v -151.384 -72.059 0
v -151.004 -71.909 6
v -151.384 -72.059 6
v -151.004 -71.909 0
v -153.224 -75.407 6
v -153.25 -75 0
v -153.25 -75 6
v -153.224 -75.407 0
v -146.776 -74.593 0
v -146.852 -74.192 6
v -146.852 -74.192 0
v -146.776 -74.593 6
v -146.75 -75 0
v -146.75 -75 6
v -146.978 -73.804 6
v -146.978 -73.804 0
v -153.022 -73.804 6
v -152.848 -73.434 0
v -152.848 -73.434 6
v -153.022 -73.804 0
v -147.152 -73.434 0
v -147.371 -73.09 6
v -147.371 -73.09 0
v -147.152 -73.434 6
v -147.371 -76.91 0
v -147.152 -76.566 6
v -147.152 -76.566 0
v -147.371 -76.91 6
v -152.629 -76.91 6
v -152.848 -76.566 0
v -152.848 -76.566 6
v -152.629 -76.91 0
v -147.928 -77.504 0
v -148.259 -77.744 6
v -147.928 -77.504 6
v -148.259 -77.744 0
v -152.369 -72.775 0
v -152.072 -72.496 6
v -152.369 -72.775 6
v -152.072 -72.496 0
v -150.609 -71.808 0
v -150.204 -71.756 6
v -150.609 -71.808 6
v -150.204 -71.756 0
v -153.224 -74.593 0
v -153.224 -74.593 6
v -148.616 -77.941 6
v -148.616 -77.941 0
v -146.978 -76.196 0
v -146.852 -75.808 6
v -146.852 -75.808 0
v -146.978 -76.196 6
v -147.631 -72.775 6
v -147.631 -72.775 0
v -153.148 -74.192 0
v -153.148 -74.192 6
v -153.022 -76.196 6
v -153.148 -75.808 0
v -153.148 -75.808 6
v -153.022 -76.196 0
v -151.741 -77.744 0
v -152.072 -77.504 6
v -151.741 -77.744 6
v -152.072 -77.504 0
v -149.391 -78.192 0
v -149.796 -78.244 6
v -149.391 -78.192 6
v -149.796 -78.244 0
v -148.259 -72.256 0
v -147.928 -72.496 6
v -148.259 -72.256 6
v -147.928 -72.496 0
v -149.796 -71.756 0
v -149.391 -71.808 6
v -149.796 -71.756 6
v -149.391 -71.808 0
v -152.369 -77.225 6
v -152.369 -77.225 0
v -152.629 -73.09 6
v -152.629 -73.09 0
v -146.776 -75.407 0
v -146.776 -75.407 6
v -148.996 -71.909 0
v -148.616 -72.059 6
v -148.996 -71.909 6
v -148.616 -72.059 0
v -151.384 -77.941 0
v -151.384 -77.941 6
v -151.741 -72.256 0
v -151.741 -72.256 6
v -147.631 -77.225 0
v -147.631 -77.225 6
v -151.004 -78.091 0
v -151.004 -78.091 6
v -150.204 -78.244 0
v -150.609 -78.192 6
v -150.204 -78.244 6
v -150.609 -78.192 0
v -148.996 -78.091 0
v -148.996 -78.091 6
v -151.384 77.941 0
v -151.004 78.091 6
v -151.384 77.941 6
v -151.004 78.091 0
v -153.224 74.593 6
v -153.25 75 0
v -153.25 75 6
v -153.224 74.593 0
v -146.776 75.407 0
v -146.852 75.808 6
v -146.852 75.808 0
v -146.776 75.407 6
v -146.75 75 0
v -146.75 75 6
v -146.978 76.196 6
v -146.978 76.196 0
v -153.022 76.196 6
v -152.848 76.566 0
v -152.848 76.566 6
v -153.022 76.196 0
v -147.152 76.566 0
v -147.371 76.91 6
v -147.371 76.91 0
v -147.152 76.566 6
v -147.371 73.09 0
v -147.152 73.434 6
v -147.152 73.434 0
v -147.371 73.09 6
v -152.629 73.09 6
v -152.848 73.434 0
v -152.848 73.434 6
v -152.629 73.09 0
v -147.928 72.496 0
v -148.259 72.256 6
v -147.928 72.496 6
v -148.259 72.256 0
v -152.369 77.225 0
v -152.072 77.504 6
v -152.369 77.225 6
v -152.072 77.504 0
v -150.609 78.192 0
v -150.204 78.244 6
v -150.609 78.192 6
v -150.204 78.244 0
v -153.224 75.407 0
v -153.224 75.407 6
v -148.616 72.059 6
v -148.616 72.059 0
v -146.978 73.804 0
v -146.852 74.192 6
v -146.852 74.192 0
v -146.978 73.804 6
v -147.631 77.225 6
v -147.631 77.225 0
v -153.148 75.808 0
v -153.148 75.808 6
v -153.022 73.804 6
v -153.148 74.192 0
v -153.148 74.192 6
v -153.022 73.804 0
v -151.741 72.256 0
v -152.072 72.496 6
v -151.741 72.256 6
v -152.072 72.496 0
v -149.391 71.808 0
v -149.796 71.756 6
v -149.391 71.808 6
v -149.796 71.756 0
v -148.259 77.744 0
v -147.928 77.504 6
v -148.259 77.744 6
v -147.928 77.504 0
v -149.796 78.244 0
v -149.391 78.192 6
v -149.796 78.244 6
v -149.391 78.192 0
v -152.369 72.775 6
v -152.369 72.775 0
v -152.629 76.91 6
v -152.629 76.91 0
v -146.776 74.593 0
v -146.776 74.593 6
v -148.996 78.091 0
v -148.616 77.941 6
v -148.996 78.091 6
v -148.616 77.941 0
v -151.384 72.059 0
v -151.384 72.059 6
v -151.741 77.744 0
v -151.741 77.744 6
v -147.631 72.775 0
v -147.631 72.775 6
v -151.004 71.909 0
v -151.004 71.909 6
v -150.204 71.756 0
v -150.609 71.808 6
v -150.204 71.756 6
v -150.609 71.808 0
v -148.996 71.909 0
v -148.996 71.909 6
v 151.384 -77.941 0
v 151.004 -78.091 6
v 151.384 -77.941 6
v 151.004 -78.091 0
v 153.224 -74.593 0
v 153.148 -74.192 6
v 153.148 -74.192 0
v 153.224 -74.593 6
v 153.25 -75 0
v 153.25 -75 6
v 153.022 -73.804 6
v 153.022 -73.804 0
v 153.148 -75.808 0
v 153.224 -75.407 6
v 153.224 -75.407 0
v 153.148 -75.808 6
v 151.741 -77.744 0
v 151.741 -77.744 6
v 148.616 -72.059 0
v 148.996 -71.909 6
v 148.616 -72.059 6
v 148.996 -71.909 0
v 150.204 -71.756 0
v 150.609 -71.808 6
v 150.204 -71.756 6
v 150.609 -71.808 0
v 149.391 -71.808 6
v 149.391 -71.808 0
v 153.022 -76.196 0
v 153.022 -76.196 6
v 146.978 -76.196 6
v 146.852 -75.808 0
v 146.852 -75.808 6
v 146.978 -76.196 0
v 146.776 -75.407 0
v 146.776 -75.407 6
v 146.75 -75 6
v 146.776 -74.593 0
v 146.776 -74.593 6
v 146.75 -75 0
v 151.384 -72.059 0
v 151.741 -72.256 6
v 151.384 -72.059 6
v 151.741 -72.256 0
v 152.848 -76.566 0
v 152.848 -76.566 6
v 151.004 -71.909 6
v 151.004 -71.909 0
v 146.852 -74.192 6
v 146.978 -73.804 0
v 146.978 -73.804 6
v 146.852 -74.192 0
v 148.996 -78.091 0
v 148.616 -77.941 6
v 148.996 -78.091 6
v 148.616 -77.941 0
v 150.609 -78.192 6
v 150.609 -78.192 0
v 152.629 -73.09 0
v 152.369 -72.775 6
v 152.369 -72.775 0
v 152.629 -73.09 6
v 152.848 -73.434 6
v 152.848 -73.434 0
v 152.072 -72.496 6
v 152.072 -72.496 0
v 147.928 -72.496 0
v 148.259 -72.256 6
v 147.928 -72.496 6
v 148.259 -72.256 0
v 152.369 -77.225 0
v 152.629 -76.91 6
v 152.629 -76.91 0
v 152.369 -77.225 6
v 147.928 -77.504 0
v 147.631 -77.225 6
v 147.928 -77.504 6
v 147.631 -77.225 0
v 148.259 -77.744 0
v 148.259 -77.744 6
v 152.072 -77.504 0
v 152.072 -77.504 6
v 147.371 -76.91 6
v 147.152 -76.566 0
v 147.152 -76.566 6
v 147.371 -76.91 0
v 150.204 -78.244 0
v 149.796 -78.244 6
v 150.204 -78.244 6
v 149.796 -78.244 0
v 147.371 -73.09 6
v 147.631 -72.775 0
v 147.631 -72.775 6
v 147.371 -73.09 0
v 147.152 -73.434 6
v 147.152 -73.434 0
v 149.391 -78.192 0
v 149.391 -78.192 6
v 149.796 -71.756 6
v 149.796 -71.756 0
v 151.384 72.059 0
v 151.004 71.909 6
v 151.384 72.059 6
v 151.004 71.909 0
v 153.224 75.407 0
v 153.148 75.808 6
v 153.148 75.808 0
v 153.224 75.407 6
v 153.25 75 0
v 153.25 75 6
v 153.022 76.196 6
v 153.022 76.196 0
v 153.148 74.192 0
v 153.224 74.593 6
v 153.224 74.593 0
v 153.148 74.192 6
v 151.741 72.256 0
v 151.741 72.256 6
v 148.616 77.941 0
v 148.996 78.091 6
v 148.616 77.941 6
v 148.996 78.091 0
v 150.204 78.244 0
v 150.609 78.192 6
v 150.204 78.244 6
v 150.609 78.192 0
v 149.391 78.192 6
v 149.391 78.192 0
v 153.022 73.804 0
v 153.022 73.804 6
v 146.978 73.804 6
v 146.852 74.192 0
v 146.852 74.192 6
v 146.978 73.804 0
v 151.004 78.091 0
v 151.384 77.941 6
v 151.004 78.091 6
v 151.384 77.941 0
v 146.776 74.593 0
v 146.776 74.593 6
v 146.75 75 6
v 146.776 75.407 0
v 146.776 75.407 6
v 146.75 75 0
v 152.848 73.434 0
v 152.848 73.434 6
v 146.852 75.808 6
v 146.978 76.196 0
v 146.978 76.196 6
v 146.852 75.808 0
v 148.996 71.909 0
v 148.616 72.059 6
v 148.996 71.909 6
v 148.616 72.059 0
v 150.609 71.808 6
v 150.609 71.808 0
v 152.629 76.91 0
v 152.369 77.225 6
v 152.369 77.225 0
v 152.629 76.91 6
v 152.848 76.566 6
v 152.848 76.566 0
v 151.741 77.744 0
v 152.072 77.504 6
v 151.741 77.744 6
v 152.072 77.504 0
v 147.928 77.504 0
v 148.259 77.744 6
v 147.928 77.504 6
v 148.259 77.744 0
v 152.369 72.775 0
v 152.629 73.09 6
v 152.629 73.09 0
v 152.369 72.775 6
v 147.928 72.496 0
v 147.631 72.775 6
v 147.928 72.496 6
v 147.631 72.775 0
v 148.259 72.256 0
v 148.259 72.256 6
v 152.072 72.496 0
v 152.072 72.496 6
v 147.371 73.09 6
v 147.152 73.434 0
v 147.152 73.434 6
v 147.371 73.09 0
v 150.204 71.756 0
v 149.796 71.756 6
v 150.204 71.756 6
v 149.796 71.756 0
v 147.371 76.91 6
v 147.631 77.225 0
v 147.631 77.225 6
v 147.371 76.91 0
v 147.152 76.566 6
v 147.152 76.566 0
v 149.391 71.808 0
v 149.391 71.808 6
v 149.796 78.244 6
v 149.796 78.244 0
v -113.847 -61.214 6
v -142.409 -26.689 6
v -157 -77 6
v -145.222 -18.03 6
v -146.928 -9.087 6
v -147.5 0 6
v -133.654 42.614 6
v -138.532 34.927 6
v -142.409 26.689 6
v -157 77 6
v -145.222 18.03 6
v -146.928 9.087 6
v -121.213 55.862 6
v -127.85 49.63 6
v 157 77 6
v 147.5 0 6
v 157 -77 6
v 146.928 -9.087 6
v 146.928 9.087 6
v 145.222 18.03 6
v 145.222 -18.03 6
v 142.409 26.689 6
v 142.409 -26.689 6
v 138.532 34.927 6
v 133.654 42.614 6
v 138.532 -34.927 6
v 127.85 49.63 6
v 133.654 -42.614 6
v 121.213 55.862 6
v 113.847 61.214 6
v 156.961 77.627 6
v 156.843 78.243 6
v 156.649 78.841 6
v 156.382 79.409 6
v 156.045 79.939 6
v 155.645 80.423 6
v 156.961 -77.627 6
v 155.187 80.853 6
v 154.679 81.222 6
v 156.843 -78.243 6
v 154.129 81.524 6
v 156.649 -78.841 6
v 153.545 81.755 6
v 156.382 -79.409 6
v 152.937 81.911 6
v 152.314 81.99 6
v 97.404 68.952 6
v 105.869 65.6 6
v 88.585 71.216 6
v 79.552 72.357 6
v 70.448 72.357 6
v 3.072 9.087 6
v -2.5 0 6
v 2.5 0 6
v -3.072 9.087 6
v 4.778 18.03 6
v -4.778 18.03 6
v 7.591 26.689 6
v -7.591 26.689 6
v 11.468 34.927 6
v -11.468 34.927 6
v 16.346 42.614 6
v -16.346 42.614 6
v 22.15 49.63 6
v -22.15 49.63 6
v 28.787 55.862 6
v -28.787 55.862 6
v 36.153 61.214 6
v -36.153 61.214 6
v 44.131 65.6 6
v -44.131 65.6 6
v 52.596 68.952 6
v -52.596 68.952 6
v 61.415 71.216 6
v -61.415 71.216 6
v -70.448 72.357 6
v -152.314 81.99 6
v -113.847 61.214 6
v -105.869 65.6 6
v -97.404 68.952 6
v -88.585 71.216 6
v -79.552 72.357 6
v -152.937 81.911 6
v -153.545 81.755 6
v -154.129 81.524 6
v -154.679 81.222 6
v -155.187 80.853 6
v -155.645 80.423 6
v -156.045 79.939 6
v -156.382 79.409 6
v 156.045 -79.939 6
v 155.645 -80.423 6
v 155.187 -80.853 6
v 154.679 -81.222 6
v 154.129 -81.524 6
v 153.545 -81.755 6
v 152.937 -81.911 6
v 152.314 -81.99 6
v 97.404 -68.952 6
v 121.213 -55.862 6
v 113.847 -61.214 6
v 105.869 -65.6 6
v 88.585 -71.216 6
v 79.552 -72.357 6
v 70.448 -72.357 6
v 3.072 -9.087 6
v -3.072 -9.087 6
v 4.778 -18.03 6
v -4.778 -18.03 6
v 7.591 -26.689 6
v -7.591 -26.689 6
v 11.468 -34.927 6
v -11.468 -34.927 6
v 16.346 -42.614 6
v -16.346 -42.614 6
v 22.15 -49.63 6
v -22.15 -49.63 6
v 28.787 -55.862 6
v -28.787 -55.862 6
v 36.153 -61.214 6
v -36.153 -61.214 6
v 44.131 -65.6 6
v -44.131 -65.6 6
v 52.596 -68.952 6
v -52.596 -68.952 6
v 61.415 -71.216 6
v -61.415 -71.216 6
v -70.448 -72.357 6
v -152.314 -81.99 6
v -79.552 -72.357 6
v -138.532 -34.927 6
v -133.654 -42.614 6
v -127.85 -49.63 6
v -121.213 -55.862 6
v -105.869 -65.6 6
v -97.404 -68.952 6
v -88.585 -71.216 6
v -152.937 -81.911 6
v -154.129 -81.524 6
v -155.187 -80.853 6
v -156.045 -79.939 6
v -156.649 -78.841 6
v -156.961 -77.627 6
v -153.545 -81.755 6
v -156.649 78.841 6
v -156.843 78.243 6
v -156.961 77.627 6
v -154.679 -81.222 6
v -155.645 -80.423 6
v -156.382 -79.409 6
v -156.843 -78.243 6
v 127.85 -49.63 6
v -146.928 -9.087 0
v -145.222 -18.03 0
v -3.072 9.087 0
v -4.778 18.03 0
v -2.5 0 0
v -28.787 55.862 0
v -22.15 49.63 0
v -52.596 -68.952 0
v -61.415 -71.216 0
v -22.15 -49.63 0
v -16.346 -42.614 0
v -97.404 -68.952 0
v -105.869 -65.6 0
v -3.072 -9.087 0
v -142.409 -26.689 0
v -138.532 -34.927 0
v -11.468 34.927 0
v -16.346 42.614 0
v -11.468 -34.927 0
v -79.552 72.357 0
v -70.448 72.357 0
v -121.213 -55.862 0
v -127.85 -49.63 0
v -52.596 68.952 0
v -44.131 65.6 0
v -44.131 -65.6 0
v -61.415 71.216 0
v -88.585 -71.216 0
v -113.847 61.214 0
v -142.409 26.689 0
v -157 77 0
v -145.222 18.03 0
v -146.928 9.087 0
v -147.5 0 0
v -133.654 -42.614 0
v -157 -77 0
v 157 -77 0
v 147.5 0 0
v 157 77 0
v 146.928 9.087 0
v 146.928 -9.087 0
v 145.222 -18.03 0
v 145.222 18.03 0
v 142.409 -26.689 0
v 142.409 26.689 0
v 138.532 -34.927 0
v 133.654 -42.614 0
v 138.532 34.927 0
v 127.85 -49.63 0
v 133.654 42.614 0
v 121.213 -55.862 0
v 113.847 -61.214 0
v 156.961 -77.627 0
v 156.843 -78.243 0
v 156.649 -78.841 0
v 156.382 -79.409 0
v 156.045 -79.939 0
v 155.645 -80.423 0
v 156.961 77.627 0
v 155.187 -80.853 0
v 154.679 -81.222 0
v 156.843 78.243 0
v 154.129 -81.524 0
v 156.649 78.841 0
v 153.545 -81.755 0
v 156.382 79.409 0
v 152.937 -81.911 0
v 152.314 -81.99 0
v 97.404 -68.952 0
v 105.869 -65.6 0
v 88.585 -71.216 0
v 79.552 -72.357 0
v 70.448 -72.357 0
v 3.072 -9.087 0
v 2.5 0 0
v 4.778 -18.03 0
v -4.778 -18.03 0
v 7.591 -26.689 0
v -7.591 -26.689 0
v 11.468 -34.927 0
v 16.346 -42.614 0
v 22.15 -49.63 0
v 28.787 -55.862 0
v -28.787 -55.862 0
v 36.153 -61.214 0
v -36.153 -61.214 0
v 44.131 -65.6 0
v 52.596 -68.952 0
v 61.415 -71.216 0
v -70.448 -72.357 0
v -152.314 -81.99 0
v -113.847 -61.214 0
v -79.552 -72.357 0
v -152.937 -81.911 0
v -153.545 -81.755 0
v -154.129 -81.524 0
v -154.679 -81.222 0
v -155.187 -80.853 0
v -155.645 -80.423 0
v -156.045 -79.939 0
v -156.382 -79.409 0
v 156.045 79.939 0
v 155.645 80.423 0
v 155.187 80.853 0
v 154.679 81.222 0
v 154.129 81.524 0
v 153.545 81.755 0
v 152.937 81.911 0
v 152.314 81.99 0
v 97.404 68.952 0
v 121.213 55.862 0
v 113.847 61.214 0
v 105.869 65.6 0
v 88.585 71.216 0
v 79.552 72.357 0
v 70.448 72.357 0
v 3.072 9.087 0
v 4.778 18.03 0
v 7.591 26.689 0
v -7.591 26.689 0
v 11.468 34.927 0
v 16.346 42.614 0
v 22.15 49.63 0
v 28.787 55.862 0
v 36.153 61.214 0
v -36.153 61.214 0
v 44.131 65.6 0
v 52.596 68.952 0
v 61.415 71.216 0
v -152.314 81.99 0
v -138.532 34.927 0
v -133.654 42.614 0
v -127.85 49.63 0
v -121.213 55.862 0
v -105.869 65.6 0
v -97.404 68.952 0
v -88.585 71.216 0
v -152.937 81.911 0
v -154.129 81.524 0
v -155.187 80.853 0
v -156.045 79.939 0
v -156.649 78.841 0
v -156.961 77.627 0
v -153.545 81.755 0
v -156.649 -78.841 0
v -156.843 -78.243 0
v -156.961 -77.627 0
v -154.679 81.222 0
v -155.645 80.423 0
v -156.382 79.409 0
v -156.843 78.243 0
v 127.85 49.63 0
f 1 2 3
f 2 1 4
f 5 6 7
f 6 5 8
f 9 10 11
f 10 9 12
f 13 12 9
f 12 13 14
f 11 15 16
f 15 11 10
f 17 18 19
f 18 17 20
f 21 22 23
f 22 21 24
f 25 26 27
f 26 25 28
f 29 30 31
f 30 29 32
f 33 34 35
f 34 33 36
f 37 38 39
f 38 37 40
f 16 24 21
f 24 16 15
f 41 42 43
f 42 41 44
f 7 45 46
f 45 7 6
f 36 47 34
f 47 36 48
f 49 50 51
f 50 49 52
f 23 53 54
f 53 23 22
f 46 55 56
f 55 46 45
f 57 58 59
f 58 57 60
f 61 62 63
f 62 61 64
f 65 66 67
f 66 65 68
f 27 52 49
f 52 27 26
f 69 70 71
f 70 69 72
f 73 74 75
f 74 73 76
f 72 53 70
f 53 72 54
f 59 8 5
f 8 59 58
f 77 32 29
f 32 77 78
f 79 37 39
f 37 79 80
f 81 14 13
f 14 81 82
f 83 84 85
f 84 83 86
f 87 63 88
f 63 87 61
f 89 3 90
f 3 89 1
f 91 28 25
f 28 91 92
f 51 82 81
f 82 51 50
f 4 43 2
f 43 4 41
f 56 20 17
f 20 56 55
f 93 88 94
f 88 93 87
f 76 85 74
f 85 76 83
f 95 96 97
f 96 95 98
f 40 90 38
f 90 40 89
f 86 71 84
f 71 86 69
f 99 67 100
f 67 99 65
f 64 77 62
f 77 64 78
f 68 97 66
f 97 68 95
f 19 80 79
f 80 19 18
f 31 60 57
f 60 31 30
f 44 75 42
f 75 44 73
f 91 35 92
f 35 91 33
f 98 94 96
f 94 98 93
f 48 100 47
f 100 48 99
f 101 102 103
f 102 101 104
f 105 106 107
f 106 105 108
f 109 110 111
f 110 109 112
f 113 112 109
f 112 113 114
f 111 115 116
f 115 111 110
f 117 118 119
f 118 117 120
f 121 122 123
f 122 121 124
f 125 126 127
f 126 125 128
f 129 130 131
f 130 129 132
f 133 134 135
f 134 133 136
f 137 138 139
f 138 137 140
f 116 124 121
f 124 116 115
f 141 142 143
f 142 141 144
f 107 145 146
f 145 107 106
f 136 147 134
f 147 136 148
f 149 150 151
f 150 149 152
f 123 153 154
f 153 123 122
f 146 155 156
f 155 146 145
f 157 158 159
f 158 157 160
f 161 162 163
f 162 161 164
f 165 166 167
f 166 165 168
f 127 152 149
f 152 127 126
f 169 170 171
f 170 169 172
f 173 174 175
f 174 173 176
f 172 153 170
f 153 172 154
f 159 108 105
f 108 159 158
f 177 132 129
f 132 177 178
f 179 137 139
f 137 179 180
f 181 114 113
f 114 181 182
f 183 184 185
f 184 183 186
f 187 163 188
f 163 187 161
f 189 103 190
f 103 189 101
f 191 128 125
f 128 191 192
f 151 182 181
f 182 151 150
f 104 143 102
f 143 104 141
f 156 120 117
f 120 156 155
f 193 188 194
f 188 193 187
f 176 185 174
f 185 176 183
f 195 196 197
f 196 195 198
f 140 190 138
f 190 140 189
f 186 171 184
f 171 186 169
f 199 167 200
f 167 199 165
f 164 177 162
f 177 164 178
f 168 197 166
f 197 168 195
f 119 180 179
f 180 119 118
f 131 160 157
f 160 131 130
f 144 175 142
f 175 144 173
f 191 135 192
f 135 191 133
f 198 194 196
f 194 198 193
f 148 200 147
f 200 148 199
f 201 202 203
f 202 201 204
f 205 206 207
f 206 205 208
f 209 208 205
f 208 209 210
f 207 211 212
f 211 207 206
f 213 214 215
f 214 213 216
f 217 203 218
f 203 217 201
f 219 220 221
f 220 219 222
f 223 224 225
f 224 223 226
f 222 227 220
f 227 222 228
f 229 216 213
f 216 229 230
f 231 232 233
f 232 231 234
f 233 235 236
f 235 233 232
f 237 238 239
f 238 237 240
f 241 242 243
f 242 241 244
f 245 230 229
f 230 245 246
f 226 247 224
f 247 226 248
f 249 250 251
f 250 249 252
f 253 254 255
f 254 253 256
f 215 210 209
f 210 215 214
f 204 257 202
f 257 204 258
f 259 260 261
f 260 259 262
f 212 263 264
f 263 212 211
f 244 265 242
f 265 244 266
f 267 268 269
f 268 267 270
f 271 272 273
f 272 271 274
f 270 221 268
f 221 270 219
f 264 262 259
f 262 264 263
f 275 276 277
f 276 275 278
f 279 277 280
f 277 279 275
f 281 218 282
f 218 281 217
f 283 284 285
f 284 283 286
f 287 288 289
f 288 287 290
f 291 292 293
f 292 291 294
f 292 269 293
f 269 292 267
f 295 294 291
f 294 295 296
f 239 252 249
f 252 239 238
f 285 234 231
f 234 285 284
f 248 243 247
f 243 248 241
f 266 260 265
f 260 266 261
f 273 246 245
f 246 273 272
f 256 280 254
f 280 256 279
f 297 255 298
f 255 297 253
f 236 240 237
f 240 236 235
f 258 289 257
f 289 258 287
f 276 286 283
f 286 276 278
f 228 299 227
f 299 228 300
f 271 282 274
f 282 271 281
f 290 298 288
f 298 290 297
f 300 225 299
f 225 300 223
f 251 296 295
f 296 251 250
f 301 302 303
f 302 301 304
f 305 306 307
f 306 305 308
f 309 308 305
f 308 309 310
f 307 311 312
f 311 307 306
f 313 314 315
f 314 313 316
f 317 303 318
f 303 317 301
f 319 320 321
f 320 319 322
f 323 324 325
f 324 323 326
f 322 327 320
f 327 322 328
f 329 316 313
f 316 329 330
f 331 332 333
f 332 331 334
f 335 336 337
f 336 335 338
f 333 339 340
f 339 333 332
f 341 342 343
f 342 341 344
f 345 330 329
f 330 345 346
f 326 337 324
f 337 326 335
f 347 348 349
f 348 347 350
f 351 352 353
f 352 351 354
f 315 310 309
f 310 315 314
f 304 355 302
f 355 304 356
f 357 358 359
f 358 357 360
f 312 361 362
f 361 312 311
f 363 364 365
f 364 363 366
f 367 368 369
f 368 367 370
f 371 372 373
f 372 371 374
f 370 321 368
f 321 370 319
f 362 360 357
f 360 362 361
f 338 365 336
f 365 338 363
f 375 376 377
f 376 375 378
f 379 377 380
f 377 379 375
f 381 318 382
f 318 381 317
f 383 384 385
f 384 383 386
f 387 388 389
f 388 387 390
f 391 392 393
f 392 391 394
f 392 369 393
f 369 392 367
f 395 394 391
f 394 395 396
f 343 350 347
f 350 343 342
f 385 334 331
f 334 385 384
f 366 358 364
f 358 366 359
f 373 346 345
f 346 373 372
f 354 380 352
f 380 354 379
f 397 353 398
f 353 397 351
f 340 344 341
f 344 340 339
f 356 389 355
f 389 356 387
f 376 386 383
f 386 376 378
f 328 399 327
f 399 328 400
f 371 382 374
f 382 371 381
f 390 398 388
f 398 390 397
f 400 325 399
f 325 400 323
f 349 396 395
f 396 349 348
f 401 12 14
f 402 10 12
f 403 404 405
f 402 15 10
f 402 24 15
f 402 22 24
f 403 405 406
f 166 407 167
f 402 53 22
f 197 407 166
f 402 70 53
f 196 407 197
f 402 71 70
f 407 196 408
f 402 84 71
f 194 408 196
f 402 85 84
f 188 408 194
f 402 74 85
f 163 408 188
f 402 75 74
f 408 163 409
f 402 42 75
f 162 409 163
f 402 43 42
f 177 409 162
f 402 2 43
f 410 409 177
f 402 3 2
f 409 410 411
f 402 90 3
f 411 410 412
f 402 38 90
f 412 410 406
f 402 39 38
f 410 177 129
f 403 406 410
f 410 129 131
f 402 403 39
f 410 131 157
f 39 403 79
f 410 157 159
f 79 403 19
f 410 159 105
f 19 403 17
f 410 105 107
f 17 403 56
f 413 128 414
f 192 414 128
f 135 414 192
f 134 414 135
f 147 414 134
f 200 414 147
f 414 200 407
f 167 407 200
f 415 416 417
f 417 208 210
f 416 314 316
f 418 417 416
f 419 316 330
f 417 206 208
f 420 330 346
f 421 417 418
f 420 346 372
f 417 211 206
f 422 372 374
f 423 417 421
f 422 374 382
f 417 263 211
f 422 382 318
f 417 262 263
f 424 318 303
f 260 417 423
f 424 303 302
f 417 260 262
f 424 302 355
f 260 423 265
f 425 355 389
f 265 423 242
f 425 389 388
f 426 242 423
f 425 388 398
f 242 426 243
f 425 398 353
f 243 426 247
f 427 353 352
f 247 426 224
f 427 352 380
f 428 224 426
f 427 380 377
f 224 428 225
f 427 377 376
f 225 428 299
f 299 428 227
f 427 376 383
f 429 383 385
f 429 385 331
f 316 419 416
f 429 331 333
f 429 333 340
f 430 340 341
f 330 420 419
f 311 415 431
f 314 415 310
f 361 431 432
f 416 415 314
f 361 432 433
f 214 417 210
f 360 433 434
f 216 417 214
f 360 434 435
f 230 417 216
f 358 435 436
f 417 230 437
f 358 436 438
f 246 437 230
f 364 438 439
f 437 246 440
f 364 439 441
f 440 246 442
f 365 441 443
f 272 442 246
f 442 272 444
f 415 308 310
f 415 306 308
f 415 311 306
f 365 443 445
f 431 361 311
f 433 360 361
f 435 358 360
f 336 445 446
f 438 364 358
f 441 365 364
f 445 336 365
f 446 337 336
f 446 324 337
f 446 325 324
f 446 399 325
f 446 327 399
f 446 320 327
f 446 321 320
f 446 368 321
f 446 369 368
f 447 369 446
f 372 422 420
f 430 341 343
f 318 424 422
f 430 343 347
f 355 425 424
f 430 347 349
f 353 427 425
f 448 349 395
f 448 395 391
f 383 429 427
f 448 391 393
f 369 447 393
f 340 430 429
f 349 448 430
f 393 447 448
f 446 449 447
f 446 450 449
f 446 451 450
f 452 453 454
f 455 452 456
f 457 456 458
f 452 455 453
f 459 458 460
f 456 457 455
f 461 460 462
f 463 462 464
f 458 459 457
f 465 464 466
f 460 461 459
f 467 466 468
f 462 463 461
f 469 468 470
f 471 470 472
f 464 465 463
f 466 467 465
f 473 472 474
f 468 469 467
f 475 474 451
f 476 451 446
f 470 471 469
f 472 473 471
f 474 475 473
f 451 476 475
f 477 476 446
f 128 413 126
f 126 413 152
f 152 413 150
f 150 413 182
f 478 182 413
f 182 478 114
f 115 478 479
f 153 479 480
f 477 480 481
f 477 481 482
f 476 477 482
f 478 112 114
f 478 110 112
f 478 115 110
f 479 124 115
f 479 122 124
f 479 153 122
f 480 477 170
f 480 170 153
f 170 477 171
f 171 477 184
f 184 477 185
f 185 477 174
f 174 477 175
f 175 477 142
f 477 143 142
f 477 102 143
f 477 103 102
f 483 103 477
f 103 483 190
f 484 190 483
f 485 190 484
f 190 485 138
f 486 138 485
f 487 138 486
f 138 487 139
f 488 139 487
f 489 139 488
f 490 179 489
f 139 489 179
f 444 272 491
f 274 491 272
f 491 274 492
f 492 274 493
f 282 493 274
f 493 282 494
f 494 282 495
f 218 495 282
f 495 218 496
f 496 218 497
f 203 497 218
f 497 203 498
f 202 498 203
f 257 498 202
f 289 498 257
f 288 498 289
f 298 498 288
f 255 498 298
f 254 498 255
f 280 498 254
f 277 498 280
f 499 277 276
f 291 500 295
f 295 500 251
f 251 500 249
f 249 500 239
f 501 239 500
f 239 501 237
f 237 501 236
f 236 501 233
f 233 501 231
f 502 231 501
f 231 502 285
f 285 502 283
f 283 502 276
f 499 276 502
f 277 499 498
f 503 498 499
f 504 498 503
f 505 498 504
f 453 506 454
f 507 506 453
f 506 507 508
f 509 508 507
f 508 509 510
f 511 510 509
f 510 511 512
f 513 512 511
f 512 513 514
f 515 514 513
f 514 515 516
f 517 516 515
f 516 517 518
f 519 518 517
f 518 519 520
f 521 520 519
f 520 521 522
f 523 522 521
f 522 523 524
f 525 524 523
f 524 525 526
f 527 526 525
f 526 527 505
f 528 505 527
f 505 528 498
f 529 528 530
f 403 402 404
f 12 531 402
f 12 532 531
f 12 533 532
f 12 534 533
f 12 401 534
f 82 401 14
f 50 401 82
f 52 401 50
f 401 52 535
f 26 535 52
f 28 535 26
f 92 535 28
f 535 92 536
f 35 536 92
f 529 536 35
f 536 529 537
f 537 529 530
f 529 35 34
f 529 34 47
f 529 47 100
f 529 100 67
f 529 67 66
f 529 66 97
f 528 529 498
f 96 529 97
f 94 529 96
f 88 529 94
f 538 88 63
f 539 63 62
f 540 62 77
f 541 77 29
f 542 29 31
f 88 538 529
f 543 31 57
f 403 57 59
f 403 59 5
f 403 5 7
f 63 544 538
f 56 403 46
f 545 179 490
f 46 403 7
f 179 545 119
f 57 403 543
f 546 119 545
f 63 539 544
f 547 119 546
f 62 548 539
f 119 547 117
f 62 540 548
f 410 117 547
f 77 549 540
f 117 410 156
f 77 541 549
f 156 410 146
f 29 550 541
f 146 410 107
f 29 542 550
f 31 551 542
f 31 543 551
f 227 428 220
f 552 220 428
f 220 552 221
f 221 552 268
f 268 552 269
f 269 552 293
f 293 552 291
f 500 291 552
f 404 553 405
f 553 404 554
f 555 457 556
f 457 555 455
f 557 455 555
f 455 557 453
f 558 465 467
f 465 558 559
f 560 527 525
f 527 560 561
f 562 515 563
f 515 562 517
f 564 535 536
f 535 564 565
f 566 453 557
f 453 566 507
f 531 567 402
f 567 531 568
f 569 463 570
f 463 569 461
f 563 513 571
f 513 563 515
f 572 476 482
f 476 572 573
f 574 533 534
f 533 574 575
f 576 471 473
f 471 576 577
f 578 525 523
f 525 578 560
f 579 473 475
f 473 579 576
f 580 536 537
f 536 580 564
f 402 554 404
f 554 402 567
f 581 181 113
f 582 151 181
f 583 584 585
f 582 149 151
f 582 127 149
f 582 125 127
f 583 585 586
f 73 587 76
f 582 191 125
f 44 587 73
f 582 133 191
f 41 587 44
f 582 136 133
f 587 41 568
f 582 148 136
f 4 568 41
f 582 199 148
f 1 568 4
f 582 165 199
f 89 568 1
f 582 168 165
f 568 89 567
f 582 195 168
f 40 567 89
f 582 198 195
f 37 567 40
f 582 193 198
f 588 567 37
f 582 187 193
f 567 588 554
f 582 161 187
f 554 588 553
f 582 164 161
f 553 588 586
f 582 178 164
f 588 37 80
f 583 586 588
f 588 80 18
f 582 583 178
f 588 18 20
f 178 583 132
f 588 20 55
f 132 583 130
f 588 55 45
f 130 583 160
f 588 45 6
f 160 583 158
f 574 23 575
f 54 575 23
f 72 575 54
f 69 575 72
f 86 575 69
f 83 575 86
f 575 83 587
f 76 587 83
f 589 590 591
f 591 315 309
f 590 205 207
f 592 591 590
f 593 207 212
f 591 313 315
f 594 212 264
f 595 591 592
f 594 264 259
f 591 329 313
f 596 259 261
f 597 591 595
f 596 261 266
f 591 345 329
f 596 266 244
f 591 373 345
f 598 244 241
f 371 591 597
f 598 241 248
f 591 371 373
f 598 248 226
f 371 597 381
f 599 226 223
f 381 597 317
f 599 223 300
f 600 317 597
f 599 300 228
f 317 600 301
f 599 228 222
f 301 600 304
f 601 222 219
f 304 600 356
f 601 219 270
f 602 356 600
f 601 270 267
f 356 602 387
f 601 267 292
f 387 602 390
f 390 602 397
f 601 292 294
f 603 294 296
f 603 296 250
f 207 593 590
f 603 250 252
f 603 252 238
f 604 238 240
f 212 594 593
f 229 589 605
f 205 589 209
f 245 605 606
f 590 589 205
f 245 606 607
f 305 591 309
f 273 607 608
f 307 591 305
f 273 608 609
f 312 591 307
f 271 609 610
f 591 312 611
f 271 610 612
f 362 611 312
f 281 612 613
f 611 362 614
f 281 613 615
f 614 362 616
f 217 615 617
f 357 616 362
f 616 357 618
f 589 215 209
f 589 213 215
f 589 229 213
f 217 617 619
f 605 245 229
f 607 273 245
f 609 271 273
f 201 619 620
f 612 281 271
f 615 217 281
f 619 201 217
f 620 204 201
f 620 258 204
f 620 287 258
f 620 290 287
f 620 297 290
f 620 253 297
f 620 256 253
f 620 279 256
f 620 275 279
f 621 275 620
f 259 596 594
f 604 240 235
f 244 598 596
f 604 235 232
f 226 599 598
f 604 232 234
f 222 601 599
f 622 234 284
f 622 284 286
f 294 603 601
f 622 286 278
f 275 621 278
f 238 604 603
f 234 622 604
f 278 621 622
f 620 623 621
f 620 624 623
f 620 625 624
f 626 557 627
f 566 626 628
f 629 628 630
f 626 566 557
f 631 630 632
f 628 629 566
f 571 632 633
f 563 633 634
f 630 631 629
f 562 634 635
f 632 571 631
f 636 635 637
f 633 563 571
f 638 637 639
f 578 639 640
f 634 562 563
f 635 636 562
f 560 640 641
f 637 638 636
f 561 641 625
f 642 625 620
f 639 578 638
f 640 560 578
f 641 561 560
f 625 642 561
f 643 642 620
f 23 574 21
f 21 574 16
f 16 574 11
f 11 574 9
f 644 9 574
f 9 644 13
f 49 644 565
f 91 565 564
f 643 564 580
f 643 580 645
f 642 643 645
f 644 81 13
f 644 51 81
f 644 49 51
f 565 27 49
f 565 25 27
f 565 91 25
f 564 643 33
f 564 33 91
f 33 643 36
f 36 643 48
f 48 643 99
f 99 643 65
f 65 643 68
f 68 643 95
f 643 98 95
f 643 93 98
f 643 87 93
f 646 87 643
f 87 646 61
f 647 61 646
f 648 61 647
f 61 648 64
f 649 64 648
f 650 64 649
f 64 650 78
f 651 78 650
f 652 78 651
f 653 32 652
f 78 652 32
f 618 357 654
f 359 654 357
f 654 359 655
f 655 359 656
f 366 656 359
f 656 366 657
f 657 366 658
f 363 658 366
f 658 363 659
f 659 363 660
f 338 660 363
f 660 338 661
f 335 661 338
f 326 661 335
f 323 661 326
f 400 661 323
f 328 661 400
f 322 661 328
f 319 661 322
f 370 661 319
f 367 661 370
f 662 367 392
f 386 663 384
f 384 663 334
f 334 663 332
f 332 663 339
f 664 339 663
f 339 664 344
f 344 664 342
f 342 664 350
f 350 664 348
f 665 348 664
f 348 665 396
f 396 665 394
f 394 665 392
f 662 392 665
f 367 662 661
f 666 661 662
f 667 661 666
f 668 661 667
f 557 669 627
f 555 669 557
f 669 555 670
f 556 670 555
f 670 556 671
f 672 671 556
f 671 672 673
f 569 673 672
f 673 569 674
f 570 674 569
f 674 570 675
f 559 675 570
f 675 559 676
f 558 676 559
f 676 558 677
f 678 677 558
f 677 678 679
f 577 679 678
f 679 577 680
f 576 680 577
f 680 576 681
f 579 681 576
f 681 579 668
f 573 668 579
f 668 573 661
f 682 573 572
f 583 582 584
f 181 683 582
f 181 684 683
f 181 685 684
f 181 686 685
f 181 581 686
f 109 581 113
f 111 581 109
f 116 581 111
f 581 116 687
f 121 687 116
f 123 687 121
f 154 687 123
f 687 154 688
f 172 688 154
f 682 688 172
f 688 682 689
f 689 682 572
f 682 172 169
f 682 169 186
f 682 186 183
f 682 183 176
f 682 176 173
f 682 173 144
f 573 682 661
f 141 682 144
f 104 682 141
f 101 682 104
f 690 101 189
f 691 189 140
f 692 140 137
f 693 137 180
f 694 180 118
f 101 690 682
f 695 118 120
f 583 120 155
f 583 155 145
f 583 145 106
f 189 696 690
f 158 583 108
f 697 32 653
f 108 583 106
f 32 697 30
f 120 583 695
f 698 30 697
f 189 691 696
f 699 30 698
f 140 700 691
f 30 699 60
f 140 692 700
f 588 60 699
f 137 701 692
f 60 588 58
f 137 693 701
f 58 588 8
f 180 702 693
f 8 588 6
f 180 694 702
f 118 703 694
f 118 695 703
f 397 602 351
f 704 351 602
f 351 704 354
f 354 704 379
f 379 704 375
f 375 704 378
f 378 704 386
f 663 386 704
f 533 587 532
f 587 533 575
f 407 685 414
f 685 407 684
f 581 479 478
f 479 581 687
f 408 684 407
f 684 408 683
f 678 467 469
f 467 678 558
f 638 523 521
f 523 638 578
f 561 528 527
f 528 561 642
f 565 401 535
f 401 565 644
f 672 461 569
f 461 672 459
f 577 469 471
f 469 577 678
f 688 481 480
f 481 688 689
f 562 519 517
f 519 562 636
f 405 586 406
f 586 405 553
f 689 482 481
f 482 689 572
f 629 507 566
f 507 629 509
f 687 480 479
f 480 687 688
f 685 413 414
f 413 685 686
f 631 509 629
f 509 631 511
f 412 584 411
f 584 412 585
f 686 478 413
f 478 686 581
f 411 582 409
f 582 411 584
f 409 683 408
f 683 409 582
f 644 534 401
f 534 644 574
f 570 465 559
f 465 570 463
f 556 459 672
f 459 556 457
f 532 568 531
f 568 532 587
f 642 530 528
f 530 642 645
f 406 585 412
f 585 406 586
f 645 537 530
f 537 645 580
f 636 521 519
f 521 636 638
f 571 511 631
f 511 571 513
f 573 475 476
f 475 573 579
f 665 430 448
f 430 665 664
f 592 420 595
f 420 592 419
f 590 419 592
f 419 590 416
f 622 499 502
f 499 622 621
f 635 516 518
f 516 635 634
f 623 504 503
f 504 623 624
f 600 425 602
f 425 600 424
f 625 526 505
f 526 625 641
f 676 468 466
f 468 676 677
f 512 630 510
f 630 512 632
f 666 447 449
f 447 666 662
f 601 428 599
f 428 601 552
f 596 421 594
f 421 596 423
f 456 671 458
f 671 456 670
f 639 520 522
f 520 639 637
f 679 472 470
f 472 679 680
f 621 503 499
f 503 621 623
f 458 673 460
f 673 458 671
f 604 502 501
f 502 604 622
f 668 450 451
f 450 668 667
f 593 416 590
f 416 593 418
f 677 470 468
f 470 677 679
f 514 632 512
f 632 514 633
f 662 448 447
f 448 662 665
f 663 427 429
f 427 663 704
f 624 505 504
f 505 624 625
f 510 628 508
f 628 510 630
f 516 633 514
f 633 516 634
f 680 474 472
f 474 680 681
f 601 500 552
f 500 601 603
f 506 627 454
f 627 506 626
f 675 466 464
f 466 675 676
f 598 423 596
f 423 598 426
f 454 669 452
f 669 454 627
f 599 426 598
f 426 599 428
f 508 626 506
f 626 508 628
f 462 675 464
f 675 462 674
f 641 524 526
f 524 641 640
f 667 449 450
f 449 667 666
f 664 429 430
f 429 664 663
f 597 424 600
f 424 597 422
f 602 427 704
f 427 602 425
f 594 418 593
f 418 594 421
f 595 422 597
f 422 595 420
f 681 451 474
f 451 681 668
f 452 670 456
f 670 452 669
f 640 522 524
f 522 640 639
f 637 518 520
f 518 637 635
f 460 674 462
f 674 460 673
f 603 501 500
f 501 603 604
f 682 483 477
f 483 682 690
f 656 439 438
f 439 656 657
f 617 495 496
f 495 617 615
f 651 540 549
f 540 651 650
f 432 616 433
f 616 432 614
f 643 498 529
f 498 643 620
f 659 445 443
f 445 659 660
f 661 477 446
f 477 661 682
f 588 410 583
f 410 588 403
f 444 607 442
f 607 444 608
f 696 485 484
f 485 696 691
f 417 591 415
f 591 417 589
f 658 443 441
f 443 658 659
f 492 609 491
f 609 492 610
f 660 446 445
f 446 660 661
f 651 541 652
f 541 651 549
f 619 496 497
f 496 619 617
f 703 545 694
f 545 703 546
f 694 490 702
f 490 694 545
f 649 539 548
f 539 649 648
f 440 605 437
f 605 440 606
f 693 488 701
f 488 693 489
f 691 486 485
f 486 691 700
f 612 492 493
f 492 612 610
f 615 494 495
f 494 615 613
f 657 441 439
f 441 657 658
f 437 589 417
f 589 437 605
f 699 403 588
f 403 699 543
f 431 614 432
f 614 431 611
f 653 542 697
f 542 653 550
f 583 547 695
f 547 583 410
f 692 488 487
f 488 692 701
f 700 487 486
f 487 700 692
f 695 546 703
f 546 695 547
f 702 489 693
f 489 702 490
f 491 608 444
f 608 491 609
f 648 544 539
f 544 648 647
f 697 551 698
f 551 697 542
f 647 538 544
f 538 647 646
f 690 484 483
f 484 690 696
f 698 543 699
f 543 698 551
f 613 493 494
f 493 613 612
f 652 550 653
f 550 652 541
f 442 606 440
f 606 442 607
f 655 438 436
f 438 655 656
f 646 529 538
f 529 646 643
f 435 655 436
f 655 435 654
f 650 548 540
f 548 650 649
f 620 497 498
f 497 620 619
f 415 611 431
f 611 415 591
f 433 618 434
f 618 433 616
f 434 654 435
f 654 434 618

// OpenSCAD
$fn = 50;


difference() {
	union() {
		hull() {
			translate(v = [-152.0000000000, 77.0000000000, 0]) {
				cylinder(h = 6, r = 5);
			}
			translate(v = [152.0000000000, 77.0000000000, 0]) {
				cylinder(h = 6, r = 5);
			}
			translate(v = [-152.0000000000, -77.0000000000, 0]) {
				cylinder(h = 6, r = 5);
			}
			translate(v = [152.0000000000, -77.0000000000, 0]) {
				cylinder(h = 6, r = 5);
			}
		}
	}
	union() {
		#translate(v = [-150.0000000000, -75.0000000000, -100.0000000000]) {
			cylinder(h = 200, r = 3.2500000000);
		}
		#translate(v = [-150.0000000000, 75.0000000000, -100.0000000000]) {
			cylinder(h = 200, r = 3.2500000000);
		}
		#translate(v = [150.0000000000, -75.0000000000, -100.0000000000]) {
			cylinder(h = 200, r = 3.2500000000);
		}
		#translate(v = [150.0000000000, 75.0000000000, -100.0000000000]) {
			cylinder(h = 200, r = 3.2500000000);
		}
		#translate(v = [-75.0000000000, 0, 0]) {
			cylinder(h = 6, r = 72.5000000000);
		}
		#translate(v = [75.0000000000, 0, 0]) {
			cylinder(h = 6, r = 72.5000000000);
		}
	}
}
